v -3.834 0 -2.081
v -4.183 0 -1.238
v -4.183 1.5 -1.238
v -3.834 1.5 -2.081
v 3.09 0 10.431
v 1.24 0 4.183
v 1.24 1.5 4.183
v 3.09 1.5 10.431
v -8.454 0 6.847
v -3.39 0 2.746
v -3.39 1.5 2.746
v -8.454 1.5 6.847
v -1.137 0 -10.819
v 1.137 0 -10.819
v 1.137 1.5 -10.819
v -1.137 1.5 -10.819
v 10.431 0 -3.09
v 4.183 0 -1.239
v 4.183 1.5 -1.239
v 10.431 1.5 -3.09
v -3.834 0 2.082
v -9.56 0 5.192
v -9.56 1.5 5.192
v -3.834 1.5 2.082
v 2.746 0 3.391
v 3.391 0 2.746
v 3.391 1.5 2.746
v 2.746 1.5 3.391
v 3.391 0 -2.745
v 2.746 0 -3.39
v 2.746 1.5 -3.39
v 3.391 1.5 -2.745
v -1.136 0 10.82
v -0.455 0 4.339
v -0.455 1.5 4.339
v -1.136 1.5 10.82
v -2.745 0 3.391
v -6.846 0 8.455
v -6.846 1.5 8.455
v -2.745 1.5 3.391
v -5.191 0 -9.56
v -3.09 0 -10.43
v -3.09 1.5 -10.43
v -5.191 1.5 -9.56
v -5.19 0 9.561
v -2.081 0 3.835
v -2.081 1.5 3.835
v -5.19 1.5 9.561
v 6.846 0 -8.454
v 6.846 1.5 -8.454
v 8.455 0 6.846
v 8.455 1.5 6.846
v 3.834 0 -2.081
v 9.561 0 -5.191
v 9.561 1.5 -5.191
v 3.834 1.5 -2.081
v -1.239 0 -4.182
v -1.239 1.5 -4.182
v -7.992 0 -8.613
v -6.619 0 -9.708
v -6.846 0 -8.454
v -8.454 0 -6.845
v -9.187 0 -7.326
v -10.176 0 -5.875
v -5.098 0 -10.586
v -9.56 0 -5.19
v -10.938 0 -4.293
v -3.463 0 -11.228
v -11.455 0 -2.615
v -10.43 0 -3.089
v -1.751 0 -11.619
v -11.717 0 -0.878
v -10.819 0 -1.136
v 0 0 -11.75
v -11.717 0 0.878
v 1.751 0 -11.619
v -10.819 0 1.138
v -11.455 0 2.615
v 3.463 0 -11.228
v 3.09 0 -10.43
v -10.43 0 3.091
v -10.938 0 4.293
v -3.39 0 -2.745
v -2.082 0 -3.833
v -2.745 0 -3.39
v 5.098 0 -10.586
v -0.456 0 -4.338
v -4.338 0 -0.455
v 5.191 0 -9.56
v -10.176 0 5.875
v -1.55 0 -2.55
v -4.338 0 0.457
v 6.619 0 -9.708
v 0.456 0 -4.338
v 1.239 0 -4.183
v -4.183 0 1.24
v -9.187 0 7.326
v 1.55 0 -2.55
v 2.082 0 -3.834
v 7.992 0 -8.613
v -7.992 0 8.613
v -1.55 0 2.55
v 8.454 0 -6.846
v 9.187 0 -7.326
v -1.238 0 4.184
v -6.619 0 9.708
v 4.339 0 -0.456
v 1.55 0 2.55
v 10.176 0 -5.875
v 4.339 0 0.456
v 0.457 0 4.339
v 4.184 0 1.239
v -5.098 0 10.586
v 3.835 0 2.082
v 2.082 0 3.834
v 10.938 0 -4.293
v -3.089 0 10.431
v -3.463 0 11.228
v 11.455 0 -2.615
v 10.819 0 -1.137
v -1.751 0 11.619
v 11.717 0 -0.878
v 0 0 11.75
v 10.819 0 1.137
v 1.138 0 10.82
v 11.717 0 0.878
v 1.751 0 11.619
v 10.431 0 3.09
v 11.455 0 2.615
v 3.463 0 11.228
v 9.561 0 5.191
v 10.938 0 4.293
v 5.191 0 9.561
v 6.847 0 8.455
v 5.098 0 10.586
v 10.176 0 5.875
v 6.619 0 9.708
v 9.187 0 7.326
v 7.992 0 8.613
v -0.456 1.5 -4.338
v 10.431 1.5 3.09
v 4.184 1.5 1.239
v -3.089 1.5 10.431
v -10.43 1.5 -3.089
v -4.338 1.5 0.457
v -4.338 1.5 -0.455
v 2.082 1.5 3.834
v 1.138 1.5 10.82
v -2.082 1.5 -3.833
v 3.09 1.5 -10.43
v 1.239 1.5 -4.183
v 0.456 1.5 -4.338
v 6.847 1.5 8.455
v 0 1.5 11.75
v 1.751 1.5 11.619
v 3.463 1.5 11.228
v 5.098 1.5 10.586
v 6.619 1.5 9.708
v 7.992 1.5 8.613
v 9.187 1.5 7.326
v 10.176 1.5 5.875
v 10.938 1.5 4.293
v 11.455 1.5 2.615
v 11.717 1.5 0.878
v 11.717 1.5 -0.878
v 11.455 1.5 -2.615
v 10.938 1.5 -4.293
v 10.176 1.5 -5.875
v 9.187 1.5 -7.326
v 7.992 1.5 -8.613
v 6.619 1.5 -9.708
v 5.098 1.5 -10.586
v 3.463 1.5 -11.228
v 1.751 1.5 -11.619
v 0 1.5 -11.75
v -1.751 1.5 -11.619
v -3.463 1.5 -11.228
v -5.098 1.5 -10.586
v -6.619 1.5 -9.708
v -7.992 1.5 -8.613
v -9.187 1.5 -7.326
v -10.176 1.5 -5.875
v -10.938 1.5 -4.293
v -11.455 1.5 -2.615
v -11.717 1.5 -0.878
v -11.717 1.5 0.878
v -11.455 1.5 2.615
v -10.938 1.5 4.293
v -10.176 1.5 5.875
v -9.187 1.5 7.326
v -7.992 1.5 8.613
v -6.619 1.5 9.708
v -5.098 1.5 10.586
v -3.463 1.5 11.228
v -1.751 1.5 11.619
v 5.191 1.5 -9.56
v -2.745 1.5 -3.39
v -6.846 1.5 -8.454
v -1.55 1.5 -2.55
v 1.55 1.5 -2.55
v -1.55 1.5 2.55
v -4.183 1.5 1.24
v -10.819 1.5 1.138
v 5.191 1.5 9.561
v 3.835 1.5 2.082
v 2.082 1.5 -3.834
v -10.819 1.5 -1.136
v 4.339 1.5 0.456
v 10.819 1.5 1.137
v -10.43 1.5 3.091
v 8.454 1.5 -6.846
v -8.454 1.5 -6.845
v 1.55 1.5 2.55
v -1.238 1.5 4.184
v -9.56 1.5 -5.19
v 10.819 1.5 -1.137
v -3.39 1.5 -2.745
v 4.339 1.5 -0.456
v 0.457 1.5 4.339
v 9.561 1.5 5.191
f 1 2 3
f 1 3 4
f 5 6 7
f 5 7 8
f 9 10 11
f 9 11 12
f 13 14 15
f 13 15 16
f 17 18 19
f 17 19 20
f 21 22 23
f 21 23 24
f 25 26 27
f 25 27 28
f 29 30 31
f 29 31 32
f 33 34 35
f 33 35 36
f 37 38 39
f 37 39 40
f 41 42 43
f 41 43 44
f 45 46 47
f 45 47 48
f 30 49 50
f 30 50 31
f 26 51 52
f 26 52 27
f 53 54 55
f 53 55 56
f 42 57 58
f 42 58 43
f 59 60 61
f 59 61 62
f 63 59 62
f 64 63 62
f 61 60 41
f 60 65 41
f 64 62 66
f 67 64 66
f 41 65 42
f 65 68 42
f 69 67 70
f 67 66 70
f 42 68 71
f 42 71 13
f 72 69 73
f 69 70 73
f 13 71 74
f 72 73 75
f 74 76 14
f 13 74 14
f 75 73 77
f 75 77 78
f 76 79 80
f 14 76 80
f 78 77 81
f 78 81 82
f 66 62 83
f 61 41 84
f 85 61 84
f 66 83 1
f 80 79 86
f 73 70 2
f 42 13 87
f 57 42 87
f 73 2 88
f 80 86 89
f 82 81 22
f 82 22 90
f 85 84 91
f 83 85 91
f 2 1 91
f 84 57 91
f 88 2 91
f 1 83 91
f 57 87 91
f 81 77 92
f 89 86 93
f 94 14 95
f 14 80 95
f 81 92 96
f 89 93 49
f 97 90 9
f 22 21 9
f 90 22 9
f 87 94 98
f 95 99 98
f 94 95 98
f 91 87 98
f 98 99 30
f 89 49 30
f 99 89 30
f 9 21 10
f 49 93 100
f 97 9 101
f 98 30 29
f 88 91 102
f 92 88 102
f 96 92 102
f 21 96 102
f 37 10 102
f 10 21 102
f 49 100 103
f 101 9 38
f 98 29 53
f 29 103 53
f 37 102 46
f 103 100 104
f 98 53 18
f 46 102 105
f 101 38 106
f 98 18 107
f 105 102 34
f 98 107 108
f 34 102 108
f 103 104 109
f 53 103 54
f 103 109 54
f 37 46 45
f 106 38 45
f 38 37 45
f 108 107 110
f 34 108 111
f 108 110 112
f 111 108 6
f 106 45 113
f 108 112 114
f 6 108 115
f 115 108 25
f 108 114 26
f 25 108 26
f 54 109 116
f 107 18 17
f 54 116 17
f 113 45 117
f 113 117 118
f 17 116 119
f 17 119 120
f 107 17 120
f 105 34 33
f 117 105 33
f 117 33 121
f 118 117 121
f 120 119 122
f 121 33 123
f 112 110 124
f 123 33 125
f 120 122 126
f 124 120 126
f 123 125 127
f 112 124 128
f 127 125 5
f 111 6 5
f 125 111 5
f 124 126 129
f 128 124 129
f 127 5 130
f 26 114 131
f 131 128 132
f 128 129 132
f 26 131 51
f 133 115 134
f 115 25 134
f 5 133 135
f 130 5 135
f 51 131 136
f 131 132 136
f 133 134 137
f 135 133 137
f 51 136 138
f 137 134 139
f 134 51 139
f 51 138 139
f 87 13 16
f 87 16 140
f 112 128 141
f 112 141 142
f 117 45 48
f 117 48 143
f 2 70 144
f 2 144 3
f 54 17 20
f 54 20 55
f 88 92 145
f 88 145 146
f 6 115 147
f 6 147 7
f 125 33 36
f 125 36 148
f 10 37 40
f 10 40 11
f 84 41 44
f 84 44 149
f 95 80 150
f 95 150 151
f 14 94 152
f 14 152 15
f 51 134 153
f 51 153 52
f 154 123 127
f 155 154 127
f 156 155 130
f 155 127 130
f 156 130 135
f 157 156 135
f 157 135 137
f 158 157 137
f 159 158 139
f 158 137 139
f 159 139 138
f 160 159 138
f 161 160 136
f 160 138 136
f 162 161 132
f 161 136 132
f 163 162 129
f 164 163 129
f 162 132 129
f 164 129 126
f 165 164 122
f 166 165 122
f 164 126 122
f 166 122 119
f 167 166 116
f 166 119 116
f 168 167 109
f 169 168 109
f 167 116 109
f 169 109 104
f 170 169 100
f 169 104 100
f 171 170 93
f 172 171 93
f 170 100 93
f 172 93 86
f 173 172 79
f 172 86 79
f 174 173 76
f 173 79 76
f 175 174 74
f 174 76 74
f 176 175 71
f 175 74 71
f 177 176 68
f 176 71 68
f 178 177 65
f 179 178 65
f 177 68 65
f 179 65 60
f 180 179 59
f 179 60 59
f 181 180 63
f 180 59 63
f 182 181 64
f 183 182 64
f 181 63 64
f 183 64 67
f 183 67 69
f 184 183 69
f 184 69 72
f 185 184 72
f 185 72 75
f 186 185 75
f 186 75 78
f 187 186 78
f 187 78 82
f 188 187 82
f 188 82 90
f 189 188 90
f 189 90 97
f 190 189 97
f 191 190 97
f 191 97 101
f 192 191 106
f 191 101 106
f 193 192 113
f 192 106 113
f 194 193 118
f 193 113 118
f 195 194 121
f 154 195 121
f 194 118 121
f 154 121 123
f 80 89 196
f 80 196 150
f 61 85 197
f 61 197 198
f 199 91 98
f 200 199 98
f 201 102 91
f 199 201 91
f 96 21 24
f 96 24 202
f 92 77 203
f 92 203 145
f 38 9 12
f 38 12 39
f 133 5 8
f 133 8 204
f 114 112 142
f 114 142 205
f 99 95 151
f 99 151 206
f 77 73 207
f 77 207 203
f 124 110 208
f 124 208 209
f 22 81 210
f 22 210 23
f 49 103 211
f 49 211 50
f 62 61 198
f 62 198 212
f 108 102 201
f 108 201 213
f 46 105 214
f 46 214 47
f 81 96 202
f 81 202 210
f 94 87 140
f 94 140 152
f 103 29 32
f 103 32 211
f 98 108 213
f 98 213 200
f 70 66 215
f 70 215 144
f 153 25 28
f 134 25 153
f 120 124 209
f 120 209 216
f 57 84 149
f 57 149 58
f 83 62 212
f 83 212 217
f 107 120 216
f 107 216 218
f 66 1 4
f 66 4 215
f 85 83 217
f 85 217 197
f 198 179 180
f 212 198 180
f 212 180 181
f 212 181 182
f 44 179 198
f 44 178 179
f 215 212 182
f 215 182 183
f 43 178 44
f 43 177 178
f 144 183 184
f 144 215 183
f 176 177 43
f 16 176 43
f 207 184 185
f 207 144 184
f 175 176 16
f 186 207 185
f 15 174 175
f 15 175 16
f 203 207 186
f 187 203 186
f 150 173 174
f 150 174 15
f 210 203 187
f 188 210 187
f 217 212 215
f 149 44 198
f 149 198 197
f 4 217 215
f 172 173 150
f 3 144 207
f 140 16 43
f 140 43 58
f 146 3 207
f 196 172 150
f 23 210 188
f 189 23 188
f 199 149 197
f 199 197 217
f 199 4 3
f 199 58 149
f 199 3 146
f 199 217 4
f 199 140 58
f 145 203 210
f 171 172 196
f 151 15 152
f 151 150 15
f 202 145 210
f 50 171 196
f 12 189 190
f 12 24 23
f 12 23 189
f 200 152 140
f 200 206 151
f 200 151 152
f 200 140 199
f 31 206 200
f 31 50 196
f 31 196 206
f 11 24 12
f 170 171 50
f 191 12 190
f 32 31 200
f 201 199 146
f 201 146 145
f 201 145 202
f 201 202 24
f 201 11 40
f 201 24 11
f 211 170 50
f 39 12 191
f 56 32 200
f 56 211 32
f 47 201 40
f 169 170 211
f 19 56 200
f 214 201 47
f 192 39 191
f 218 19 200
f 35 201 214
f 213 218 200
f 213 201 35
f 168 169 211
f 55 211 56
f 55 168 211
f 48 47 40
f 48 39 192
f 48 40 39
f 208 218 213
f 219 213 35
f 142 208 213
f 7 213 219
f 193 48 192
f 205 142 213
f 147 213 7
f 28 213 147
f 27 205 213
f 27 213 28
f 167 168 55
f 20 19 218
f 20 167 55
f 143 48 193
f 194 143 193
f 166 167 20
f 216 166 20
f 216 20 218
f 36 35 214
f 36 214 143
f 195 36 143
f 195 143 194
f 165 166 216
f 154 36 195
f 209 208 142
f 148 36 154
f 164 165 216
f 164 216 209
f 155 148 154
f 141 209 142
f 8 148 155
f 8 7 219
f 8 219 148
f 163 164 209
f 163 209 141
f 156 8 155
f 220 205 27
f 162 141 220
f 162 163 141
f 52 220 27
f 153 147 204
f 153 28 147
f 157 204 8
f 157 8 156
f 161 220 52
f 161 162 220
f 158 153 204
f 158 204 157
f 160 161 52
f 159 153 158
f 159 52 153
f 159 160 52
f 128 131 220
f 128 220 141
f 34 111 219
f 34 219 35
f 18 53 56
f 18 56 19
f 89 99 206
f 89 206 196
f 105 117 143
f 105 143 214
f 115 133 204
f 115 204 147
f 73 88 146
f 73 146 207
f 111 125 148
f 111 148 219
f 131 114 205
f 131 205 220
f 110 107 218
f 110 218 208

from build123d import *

# Parameters (mm, degrees)
SKETCH1_R           = 11.75
SKETCH1_W           = 3.1
SKETCH1_H           = 5.1
BOSS_EXTRUDE1_DEPTH = 1.5


with BuildPart() as part:
    # Sketch1 (on Top Plane) → Boss-Extrude1 (new body)
    with BuildSketch(Plane(origin=(0, 0, 0), x_dir=(1, 0, 0), z_dir=(0, 1, 0))):
        with Locations(Location((0, 0, 0), (0, 0, 270))):
            Circle(SKETCH1_R)
        Rectangle(SKETCH1_W, SKETCH1_H, mode=Mode.SUBTRACT)
        Polygon((0.455975537, 4.338317439), (1.137082311, 10.81861552), (-1.137082311, 10.81861552), (-0.455975537, 4.338317439), align=None, mode=Mode.SUBTRACT)
        Polygon((2.081681544, 3.833682994), (5.190844864, 9.560049478), (3.089790717, 10.430334601), (1.239148612, 4.182671561), align=None, mode=Mode.SUBTRACT)
        Polygon((3.390522808, 2.745330804), (8.454400744, 6.845978303), (6.846323518, 8.454055528), (2.745676019, 3.390177592), align=None, mode=Mode.SUBTRACT)
        Polygon((4.183240111, 1.238952624), (10.430903151, 3.089594729), (9.560618028, 5.190648876), (3.834251544, 2.081485556), align=None, mode=Mode.SUBTRACT)
        Polygon((4.339149431, -0.456119123), (10.819447512, -1.137225897), (10.819447512, 1.136938725), (4.339149431, 0.455831951), align=None, mode=Mode.SUBTRACT)
        Polygon((3.834514986, -2.08182513), (9.56088147, -5.19098845), (10.431166593, -3.089934303), (4.183503553, -1.239292198), align=None, mode=Mode.SUBTRACT)
        Polygon((2.746162796, -3.390666394), (6.846810295, -8.45454433), (8.45488752, -6.846467104), (3.391009584, -2.745819606), align=None, mode=Mode.SUBTRACT)
        Polygon((1.239784616, -4.183383697), (3.090426721, -10.431046737), (5.191480868, -9.560761614), (2.082317548, -3.83439513), align=None, mode=Mode.SUBTRACT)
        Polygon((-0.455287131, -4.339293017), (-1.136393905, -10.819591098), (1.137770717, -10.819591098), (0.456663943, -4.339293017), align=None, mode=Mode.SUBTRACT)
        Polygon((-2.080993138, -3.834658572), (-5.190156458, -9.561025056), (-3.089102311, -10.431310179), (-1.238460206, -4.183647139), align=None, mode=Mode.SUBTRACT)
        Polygon((-3.389834402, -2.746306382), (-8.453712338, -6.846953881), (-6.845635112, -8.455031106), (-2.744987614, -3.39115317), align=None, mode=Mode.SUBTRACT)
        Polygon((-4.182551705, -1.239928202), (-10.430214745, -3.090570307), (-9.559929622, -5.191624454), (-3.833563138, -2.082461134), align=None, mode=Mode.SUBTRACT)
        Polygon((-4.338461025, 0.455143545), (-10.818759106, 1.136250319), (-10.818759106, -1.137914303), (-4.338461025, -0.456807529), align=None, mode=Mode.SUBTRACT)
        Polygon((-3.83382658, 2.080849552), (-9.560193064, 5.190012872), (-10.430478187, 3.088958725), (-4.182815147, 1.23831662), align=None, mode=Mode.SUBTRACT)
        Polygon((-2.74547439, 3.389690816), (-6.846121889, 8.453568752), (-8.454199114, 6.845491526), (-3.390321178, 2.744844027), align=None, mode=Mode.SUBTRACT)
        Polygon((-1.23909621, 4.182408119), (-3.089738315, 10.430071159), (-5.190792462, 9.559786036), (-2.081629142, 3.833419552), align=None, mode=Mode.SUBTRACT)
    extrude(amount=BOSS_EXTRUDE1_DEPTH)


solid = part.part
